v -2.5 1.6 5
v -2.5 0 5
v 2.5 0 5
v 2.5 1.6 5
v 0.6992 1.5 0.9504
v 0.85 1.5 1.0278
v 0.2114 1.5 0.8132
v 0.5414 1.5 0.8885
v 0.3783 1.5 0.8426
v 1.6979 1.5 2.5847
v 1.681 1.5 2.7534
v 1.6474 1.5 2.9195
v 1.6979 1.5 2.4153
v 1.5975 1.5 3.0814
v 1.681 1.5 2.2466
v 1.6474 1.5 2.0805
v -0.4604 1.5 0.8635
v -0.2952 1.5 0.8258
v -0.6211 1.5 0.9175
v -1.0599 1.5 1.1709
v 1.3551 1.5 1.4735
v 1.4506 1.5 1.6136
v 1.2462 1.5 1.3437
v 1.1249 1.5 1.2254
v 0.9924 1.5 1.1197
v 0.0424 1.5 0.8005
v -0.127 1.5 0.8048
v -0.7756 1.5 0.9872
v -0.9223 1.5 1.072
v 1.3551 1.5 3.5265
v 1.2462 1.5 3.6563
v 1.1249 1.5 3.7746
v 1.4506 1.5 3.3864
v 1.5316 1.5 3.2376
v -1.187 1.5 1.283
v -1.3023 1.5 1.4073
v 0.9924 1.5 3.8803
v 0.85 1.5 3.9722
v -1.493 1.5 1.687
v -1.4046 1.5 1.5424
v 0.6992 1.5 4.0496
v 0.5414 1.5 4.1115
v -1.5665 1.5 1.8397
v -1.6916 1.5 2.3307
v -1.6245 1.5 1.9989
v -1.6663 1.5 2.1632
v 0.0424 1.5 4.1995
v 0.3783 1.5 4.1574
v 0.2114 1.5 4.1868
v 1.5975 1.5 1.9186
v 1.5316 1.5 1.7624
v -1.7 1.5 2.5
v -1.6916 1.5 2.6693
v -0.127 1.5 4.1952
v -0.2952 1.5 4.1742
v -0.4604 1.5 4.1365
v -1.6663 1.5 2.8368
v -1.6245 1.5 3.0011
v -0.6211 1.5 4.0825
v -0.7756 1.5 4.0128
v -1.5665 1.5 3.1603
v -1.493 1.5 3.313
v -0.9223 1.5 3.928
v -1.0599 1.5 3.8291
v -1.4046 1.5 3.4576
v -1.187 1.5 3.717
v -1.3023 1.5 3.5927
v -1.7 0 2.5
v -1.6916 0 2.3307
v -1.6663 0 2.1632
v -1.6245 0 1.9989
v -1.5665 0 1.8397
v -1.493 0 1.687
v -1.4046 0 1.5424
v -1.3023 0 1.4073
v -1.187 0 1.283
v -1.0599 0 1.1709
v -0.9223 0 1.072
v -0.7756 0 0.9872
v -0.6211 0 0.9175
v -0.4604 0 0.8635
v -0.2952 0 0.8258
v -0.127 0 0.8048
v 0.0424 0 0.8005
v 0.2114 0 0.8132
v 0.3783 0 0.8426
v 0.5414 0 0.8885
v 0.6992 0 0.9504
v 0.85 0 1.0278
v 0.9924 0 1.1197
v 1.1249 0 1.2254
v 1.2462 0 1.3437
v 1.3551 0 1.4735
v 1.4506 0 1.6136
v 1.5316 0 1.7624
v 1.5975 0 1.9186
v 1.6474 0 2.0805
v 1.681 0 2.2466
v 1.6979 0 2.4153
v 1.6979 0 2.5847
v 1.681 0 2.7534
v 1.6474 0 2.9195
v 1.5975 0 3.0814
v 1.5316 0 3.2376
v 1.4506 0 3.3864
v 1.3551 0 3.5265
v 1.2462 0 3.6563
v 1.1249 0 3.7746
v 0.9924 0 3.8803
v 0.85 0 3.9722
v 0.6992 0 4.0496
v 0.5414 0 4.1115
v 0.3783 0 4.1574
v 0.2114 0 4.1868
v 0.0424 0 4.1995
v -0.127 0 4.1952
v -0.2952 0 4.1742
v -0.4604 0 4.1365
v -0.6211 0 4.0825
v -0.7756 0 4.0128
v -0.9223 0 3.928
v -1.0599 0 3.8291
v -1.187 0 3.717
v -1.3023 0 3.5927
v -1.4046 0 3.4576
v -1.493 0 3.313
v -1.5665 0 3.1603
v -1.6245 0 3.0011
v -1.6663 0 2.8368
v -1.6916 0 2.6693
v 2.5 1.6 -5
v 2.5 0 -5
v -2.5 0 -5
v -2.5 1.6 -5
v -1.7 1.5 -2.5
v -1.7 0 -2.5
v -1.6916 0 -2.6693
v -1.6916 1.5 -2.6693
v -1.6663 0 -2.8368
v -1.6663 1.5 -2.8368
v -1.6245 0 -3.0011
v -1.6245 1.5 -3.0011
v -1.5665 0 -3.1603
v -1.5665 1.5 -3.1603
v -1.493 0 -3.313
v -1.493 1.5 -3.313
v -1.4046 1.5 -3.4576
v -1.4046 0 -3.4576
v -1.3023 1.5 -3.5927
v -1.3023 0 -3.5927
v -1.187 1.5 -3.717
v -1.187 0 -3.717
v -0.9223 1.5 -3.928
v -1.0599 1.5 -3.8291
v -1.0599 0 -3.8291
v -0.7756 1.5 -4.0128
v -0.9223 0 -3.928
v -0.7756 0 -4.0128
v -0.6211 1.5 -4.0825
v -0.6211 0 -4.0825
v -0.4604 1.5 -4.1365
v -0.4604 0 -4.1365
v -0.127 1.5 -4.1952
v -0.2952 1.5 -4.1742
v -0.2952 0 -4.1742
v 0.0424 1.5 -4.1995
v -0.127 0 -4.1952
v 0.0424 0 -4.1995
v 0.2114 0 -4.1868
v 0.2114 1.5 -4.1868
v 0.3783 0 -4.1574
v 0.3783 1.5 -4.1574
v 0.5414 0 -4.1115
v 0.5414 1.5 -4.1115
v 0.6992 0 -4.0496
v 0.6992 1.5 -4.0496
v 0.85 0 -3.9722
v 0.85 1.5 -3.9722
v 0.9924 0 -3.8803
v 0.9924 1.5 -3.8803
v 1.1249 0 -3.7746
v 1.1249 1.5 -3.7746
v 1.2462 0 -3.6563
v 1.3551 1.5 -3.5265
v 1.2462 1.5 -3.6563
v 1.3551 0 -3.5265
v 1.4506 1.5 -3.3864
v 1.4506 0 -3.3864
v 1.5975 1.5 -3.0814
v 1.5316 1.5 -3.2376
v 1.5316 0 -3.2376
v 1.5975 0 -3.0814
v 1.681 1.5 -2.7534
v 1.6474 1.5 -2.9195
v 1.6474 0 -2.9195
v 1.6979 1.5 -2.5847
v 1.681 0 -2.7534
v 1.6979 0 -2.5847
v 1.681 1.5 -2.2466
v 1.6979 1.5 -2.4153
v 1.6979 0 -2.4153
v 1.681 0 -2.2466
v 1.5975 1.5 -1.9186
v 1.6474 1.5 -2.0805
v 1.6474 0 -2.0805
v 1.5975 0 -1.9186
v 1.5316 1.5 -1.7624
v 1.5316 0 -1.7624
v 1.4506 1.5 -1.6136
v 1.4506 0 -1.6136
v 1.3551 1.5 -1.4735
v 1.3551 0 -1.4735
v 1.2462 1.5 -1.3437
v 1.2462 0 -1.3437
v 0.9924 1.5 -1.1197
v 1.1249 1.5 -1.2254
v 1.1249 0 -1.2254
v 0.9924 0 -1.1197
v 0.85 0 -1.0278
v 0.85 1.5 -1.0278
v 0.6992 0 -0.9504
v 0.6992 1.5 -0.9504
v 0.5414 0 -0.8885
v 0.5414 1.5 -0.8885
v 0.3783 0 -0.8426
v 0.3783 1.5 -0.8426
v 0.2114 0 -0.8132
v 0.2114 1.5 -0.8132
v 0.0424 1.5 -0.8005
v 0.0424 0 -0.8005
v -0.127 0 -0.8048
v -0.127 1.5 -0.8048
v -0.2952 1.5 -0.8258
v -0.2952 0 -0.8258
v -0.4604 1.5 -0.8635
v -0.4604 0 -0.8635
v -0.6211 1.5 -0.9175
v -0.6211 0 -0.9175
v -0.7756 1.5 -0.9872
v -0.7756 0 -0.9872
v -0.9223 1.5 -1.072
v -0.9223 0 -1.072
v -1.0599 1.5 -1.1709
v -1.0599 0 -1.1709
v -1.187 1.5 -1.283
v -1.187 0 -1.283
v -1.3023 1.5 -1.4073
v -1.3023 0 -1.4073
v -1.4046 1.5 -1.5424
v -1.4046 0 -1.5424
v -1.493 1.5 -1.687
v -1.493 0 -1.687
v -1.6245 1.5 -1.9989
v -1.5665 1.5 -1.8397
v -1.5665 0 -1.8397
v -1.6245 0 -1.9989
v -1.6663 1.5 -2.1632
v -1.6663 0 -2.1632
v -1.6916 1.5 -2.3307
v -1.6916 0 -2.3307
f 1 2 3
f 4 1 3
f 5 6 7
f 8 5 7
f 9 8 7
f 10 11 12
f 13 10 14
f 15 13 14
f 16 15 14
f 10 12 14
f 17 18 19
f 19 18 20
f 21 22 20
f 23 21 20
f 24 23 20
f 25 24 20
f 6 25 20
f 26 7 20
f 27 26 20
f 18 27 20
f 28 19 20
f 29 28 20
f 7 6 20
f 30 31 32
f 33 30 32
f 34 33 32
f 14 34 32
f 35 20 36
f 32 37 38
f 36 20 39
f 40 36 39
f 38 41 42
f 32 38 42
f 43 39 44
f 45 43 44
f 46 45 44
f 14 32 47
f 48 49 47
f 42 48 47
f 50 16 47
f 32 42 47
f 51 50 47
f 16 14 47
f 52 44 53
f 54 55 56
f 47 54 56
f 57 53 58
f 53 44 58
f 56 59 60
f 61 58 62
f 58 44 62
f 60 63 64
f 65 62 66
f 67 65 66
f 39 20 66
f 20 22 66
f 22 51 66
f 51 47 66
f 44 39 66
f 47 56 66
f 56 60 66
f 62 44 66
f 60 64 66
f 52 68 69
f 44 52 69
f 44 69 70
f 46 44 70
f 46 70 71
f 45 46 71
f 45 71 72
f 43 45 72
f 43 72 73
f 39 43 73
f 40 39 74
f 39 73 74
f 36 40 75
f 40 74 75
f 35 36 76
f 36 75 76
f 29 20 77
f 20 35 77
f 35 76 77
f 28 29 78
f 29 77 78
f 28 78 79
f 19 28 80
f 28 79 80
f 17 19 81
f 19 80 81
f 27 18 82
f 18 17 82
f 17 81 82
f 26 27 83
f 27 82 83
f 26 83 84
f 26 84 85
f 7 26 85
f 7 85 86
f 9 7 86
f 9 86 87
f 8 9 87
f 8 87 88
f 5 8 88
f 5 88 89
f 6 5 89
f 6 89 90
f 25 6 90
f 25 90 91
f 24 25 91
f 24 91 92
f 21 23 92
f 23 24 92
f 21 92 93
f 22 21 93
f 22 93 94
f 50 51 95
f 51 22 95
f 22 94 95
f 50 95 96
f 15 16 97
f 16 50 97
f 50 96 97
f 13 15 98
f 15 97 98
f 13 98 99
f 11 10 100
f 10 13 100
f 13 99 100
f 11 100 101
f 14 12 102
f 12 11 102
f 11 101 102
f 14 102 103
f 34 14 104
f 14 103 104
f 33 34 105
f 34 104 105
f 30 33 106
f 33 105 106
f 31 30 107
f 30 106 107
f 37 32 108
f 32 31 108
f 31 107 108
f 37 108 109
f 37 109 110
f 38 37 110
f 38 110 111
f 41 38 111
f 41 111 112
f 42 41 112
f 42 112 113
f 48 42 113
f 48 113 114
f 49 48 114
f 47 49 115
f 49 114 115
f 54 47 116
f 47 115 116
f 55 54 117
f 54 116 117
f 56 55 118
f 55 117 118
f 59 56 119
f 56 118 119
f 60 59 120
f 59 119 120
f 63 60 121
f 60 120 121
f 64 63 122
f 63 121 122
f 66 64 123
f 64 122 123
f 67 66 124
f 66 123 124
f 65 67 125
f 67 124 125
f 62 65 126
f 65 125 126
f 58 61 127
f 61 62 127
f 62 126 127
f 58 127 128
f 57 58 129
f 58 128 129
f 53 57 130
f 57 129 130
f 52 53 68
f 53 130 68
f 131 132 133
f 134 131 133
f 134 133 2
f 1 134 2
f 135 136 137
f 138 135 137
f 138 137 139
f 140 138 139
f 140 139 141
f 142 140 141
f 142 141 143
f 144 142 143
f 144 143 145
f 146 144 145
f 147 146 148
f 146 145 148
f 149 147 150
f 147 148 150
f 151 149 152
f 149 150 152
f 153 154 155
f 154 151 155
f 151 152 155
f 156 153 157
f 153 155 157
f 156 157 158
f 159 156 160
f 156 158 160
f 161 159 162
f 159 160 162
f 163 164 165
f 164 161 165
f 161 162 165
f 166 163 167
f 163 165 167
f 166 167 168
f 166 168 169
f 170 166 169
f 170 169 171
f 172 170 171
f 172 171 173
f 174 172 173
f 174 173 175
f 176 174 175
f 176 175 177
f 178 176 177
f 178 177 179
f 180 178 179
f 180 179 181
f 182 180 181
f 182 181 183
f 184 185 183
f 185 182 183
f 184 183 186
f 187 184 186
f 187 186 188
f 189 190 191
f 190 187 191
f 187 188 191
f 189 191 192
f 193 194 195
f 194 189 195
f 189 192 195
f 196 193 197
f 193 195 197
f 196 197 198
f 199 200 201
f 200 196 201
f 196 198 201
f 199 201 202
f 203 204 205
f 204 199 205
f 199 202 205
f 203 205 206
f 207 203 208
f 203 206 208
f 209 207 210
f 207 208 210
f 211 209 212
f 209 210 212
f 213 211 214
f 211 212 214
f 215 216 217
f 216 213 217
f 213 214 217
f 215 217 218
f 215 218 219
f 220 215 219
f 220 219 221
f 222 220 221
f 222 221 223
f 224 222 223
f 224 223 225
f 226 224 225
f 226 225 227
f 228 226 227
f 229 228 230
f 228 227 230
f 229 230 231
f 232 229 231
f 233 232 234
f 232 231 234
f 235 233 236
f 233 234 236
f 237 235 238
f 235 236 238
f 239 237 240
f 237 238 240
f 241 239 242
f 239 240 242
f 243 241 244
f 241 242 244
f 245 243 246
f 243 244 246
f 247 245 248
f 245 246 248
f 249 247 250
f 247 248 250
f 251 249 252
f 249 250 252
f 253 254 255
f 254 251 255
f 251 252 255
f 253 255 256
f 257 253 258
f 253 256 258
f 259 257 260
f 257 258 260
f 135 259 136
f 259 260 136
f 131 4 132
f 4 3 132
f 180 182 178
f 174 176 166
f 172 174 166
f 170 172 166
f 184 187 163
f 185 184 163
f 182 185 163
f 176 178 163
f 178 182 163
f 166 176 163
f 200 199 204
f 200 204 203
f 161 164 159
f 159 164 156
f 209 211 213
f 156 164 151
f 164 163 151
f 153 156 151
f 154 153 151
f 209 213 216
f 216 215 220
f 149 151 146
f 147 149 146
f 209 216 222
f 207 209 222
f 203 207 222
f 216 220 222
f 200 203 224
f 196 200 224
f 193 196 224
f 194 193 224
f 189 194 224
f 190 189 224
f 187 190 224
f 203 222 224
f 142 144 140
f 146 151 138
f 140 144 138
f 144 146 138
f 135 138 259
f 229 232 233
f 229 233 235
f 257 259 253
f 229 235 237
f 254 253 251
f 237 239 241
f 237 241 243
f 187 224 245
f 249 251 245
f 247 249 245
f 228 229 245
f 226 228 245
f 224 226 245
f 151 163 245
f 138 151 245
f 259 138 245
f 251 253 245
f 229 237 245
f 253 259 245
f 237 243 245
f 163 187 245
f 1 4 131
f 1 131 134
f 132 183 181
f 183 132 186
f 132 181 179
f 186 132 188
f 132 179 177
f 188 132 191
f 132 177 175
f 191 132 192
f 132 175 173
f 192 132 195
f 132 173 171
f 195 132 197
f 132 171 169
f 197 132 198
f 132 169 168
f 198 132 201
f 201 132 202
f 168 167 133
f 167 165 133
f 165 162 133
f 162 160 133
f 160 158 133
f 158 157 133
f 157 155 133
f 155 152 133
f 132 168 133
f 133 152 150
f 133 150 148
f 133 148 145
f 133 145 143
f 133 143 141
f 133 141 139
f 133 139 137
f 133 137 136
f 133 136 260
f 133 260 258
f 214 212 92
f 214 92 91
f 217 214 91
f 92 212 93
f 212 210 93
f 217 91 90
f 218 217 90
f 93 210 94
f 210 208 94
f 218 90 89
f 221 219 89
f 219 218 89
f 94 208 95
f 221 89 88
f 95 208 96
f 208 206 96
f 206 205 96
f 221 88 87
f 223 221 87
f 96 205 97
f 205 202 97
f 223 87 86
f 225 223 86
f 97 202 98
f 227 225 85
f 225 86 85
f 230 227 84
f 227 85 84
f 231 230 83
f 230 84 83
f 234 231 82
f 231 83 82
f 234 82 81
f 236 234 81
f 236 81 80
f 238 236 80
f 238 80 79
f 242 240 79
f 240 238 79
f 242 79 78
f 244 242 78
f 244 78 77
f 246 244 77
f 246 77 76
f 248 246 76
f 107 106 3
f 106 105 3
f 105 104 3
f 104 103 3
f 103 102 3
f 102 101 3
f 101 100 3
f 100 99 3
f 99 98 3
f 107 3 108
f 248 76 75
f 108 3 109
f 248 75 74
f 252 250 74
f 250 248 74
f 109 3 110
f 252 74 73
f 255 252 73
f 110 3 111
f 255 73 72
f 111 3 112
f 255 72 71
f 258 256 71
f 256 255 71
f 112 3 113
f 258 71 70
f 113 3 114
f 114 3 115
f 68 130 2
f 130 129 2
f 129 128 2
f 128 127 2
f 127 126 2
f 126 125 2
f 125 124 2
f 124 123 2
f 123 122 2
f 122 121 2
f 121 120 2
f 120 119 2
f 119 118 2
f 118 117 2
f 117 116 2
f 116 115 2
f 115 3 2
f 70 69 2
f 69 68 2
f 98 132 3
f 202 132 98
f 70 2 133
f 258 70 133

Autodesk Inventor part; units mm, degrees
ref_plane "YZ Plane" through (0, 0, 0) normal (1, 0, 0) x (0, 1, 0)
ref_plane "XZ Plane" through (0, 0, 0) normal (0, 1, 0) x (-1, 0, 0)
ref_plane "XY Plane" through (0, 0, 0) normal (0, 0, 1) x (1, 0, 0)
sketch "草圖1" plane through (0, 0, 0) normal (0, 1, 0) x (-1, 0, 0)
  line L0 (2.5, 5) -> (-2.5, 5)
  line L1 (-2.5, 5) -> (-2.5, -5)
  line L2 (-2.5, -5) -> (2.5, -5)
  line L3 (2.5, -5) -> (2.5, 5)
  circle A0 centre (0, 2.5) radius 1.7
  line L4 (2.5, 0) -> (-2.5, 0) construction
  circle A1 centre (0, -2.5) radius 1.7
  point P0 (0, 0)
  point P1 (0, 5)
  dimension "d0" = 5
  dimension "d1" = 10
  dimension "d2" = 3.4
  dimension "d3" = 2.5
  dimension "d4" = 2.5
extrude "擠出1" add sketch "草圖1" along normal blind 1.6 contours L3 L2 L1 L0 | A0 | A1
extrude "擠出2" cut sketch "草圖1" along normal blind 1.5 contours A0 | A1
extrude "擠出3" cut sketch "草圖1" along normal blind 1.5 contours A0 | A1
properties part number "110033226_ipt_12_平滑面(2x1)"
